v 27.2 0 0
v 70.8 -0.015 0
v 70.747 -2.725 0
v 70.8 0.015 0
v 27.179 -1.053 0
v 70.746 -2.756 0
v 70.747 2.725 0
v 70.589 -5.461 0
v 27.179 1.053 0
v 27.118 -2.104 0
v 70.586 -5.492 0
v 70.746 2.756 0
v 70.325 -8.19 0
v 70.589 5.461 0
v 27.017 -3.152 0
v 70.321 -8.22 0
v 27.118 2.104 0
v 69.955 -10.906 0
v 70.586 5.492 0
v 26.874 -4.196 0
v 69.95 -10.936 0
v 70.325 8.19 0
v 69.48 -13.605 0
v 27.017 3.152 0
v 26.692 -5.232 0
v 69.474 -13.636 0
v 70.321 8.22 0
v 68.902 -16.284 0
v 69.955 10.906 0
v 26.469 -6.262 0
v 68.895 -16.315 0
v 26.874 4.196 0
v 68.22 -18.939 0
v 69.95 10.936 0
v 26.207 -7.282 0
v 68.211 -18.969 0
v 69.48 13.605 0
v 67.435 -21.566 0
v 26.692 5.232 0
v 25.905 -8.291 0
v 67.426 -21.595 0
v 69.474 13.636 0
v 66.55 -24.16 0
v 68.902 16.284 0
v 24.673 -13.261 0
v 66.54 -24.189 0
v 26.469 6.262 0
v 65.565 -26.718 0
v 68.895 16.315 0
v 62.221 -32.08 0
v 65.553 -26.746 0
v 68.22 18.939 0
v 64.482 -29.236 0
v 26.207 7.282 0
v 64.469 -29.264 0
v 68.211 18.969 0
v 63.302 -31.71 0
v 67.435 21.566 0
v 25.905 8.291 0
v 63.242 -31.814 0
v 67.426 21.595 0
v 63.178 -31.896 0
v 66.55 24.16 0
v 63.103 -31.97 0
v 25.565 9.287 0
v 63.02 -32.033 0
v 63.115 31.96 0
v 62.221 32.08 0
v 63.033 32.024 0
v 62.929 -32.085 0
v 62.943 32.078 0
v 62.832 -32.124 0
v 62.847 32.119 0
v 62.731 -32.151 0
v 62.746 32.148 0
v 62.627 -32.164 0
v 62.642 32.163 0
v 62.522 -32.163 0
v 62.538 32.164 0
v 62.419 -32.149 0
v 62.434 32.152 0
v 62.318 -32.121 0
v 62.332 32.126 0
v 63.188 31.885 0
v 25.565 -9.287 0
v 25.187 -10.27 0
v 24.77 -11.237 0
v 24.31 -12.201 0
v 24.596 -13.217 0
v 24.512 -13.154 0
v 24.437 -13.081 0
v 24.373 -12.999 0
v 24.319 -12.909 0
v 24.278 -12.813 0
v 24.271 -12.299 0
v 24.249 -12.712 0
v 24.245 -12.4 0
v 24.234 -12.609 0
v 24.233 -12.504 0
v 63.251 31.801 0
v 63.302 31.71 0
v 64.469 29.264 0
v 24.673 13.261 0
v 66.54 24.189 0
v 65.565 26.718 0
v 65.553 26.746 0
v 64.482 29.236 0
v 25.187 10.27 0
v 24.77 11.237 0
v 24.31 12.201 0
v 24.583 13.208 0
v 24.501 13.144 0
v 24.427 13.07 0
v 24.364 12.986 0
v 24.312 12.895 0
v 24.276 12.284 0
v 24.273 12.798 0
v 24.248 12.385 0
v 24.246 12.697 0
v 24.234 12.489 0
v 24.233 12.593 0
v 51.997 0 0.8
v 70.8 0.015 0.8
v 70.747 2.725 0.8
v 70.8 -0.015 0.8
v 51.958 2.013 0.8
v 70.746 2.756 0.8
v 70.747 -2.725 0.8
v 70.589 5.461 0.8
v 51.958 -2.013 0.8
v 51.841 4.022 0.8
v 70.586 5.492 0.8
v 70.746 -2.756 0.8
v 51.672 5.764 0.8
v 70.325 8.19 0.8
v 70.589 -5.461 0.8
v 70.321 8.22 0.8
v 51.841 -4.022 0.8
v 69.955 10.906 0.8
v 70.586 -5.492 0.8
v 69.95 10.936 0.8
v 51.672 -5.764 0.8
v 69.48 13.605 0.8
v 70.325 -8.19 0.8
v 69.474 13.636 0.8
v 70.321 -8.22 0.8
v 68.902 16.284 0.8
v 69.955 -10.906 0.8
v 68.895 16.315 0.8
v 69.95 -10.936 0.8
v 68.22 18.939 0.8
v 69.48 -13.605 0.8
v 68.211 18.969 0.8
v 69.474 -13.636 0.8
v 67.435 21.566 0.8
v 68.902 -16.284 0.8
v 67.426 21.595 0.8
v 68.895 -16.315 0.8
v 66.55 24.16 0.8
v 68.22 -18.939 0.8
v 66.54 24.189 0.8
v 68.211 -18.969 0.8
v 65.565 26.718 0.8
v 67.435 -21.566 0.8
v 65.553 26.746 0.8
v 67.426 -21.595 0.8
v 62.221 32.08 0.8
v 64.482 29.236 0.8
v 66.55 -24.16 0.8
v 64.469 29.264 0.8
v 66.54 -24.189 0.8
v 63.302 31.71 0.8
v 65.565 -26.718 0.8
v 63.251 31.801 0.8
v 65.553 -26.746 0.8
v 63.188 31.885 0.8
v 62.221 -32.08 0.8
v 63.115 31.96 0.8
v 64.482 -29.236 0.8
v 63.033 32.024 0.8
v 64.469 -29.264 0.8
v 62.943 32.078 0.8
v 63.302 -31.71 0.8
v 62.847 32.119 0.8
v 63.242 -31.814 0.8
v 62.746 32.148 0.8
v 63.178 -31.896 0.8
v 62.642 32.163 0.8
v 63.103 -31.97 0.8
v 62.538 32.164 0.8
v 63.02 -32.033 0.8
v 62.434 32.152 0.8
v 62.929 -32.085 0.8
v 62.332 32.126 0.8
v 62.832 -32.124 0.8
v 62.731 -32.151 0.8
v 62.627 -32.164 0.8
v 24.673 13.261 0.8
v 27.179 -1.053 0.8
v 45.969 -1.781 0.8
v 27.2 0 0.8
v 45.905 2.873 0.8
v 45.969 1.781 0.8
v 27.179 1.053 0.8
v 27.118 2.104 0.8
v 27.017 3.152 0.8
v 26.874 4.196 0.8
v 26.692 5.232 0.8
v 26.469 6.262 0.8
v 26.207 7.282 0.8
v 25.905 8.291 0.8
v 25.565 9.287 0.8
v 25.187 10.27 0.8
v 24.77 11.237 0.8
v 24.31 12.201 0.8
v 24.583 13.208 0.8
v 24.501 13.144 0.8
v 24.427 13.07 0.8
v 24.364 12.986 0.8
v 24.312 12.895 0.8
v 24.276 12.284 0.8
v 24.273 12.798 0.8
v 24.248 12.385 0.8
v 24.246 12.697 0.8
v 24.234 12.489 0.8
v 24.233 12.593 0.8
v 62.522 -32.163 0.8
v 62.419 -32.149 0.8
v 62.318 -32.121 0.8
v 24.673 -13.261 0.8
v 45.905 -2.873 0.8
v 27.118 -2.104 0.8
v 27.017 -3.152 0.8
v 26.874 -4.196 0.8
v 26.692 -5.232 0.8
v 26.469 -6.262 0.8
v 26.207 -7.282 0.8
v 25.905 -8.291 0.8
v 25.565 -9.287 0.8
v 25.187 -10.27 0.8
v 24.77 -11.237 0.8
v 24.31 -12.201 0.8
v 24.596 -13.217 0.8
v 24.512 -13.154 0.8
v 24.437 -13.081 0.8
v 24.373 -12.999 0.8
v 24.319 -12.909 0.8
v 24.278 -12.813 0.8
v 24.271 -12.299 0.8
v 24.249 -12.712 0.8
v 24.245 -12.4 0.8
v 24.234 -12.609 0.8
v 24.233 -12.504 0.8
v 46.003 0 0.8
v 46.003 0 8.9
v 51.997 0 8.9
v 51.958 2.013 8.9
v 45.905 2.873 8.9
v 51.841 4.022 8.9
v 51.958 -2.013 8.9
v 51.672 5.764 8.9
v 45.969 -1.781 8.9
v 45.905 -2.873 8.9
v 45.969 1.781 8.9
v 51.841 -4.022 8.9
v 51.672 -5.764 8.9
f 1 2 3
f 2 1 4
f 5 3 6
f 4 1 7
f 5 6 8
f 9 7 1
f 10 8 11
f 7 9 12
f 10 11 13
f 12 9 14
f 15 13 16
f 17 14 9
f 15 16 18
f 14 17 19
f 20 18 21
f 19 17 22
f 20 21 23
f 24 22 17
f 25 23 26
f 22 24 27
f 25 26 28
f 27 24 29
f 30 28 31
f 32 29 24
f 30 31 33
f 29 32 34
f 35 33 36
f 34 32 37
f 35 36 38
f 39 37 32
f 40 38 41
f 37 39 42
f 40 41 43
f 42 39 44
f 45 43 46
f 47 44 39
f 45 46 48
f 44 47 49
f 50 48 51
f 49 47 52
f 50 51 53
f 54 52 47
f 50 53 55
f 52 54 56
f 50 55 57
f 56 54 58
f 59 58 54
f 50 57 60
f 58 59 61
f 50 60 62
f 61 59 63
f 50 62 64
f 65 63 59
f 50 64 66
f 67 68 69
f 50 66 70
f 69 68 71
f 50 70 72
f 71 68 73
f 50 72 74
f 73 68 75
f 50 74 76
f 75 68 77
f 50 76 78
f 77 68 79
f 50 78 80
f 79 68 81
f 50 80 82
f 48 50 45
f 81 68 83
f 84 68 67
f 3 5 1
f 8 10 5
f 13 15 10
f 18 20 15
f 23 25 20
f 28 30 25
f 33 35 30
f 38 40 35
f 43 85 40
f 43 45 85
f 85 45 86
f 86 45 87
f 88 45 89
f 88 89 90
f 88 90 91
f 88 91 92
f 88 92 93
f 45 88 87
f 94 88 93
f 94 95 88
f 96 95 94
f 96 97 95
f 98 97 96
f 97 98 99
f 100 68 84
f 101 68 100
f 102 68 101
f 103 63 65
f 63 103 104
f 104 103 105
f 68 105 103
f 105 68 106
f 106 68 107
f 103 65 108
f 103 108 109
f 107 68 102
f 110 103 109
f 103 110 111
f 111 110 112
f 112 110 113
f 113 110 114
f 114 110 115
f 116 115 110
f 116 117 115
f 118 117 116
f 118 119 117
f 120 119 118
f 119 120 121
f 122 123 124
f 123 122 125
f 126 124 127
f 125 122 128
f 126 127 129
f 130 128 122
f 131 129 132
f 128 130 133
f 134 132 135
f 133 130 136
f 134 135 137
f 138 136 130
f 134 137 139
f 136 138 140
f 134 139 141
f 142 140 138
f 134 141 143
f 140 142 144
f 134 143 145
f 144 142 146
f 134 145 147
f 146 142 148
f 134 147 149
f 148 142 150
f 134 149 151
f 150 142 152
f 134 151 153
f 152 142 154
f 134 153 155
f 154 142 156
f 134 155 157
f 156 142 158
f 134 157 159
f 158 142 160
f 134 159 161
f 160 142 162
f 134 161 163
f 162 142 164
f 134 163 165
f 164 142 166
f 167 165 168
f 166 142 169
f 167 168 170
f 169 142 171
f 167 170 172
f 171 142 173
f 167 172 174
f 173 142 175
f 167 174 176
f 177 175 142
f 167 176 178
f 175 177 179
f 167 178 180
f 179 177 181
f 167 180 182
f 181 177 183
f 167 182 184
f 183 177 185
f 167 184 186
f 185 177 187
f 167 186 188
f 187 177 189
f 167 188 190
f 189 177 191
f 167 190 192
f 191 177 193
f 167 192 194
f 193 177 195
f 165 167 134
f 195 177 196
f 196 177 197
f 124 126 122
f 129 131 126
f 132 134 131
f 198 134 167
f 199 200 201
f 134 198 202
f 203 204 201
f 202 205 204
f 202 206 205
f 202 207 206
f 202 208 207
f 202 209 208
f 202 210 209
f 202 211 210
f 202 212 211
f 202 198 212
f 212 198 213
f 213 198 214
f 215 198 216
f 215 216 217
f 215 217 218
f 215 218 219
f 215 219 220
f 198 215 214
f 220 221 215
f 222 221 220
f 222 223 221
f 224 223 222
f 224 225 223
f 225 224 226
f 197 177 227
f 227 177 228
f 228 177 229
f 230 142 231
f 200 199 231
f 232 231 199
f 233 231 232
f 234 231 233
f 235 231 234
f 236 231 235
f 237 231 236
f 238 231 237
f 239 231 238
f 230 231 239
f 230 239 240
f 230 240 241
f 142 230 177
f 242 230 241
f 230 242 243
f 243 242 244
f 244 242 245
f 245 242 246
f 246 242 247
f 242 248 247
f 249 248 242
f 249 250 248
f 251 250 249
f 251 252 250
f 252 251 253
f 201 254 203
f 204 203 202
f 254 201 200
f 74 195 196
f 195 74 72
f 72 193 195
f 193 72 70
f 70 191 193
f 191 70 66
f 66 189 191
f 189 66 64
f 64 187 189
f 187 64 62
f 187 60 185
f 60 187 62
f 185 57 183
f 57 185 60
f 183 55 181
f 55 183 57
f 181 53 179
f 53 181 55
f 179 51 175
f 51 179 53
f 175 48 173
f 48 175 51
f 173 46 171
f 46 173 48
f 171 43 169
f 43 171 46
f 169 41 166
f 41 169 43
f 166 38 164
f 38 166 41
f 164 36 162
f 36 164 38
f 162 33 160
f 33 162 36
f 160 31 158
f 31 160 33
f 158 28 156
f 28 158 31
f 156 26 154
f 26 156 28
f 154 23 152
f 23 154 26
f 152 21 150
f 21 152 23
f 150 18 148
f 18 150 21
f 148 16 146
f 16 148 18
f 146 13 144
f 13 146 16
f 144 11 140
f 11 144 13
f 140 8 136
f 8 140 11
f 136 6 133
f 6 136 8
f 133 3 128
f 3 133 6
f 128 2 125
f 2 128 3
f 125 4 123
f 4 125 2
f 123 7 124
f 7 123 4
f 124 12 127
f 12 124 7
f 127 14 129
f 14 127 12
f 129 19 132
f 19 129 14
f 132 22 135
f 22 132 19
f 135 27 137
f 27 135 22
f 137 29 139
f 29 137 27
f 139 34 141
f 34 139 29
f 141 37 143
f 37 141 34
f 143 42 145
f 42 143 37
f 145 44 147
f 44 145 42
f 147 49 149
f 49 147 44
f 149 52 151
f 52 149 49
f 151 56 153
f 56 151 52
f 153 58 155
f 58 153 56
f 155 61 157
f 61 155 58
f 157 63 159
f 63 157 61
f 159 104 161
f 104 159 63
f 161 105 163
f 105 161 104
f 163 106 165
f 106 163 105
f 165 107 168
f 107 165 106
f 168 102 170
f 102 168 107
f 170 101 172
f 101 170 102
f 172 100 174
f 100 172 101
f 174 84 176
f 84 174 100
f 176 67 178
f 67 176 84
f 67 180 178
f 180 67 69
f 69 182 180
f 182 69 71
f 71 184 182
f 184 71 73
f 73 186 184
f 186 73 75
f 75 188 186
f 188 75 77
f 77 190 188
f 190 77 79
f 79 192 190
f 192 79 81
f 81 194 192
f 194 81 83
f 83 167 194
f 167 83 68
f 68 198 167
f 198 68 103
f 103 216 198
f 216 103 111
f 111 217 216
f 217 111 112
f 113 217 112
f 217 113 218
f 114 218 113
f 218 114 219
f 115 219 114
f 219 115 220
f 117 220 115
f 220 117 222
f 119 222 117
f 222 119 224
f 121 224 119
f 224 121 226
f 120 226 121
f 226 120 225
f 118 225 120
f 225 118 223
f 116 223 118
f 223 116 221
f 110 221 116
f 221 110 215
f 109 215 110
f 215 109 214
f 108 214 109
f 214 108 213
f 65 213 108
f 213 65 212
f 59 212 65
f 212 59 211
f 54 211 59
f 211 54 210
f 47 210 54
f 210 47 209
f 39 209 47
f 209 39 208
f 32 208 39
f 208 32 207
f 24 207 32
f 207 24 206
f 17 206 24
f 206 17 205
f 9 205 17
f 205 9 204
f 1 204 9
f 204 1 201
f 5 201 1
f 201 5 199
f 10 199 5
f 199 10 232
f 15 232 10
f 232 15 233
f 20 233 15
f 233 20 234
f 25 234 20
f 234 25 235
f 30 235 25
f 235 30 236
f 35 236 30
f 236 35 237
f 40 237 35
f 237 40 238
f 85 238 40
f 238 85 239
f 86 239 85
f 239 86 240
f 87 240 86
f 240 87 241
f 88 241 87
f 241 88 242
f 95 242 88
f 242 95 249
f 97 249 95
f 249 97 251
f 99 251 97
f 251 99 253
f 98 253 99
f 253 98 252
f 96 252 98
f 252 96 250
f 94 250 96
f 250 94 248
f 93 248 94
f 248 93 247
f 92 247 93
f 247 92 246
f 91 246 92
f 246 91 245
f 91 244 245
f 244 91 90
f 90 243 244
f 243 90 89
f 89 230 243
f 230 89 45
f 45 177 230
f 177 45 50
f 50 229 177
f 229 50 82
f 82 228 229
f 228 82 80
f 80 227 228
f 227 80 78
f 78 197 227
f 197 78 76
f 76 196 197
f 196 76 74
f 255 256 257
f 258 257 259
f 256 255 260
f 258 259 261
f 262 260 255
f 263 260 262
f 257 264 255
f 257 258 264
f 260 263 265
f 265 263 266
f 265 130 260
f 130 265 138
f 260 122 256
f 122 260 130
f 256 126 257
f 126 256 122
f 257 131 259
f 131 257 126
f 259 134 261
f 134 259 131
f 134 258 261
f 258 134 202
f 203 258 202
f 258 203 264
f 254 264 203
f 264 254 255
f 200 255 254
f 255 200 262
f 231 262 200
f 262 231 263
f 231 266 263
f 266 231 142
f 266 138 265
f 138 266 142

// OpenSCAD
// file: parameters.scad
// =============================================================================
// Gen-BR — nightly 2026-10-09 (physics_scorer, honest magpylib watts)
// Rotor-only swap for Gen-BO: the diametric Ø5 assists move from ±7 mm to ±6.2 mm around the R50 pole ring (R43.8/50/56.2), the closest spacing that still leaves a 0.9 mm printed web between Ø5.3 pockets (rule ≥0.8). Everything else — bobbins, 595 t windings, stator, Ø134 steel — is Gen-BO. Tonight's 138-row refine scan (ring radius 49–51, coil radii ±0.5, build ±0.4, copper height 7.9–8.3) found nothing better: the 8p/6c flush-seat family is saturated under the ~370 m wire budget, so this is a hair-width step (about +0.2 % over Gen-BO), not a breakthrough.
// Clocking 0 deg (magnets N facing S) + D-flat keyed bore + index notch + flip-symmetric hole map.
// Windable 2-piece bobbin; turns = physics_scorer turns_fit; copper only between flanges.
// Steel back-iron: 2× Ø134 × 4.76 mm (3/16") mild-steel discs (steel_backiron_disc.dxf); magnets sit ON the steel
// (through-pockets) -> score with --back-iron.
// =============================================================================
topology            = "dual_rotor";

// --- Wire / winding (physics_scorer winding-fit) -------------------------------
wire_awg            = 26;
wire_od             = 0.45;     // insulated OD mm (bare 0.405)
fill_realistic      = 0.65;     // insulated-wire area / window (DENSE layered wind with a jig; scorer cap 0.65)
turns               = 595;       // = physics_scorer turns_fit (do NOT raise)
coil_former_type    = "bobbin";
coil_core_inset     = 18.00;     // radial copper build: hub = copper boundary inset by this
wind_build_axial    = 0.0;      // nothing proud of the flanges
wind_build_radial   = 0.0;

// --- Bobbin (base + lid) ---------------------------------------------------------
coil_id_r           = 28.00;    // copper boundary sector
coil_od_r           = 70.00;
span_deg            = 53.24;    // = pitch - 2*asin((wall+0.85)/coil_id_r) -> >=1.2 mm stator web
former_web          = 8.10;     // copper height between flanges (TALL copper: steel keeps Bz up)
flange_t            = 0.80;     // >= 0.8 mm FDM wall rule (tall winds push on the flanges)
wall                = 0.80;     // flange lip beyond copper
former_bare_h       = former_web + 2 * flange_t;
coil_envelope_h     = former_bare_h + 2 * wind_build_axial;
tab_w               = 7.0;
tab_len             = 7.0;
tab_h               = former_bare_h / 2;
pin_d               = 1.9;      // 1.75 mm filament locating pin
coil_mount_r        = coil_od_r + 0.2 + 4.0;
lead_y              = 1.6;
lead_slot_w         = 0.9;
lead_groove_d       = 0.6;

// --- Gap -------------------------------------------------------------------------
run_clear           = 0.50;     // rotor face -> flange
gap_spacer_h        = run_clear + wind_build_axial;
m2m                 = coil_envelope_h + 2 * run_clear;   // rotor face to rotor face (= gap_sleeve length)

// --- Stator ----------------------------------------------------------------------
coil_stations       = 6;
bay_clear           = 0.25;
stator_thick        = former_bare_h;                        // bobbins flush both faces
stator_od           = 158;
shaft_clear_stator  = 14.0;     // stator is static; gap sleeve OD 12 spins inside

// --- Rotor(s) --------------------------------------------------------------------
magnet_Br           = 1.43;     // N52
magnet_d_large      = 20.0;
magnet_h_large      = 5.0;      // one O20x5 per pocket
magnet_h_small      = 5.0;      // one O5x5 per pocket
halbach_magnetisation = "diametric"; // O5x5 assist magnets MUST be DIAMETRICALLY magnetised (tangential)
rotor_b_same_axis   = true;     // same-index magnets share one axis: N faces S across the gap
large_pocket_d      = 20.3;
small_pocket_d      = 5.3;
pocket_h            = 5.00;     // THROUGH the carrier: magnet back face sits on the steel disc (FLUSH seat: carrier = magnet height, magnet face level with the rotor face)
large_n             = 8;
R_large             = 50.0;
R_small_inner       = 43.8;
R_small_mid         = 50.0;
R_small_outer       = 56.2;
small_r_list        = [R_small_inner, R_small_mid, R_small_outer];   // O5 pockets between poles
carrier_od          = 134.0;
carrier_thick       = pocket_h;
hub_h               = 12.0;     // > steel_t + insert: radial set-screw clears the steel
hub_od              = 24.0;     // slim hub so the M4 brace rods fit at R~18 inside the coil ring
hub_insert_d        = 4.0;      // M3 heat-set insert, radial, bears on the D-flat
rotor_b_offset_deg  = 0.0;      // CLOCKING: magnets directly opposite
shaft_key           = "dflat";
dflat_depth         = 0.5;      // 8 mm shaft with 0.5 mm flat (7.5 across flat)
index_notch_d       = 3.0;

// --- Steel back-iron (buyable laser-cut) -------------------------------------------
steel_t             = 4.76;      // mild steel thickness (image method ignores it; sized from steel_flux.py so the return path stays well below saturation)
steel_center_hole   = 26.0;     // slips over the rotor hub (OD 24)
steel_od            = carrier_od;   // steel disc OD = rotor carrier OD

// --- Modular MAX interface ----------------------------------------------------------
shaft_bore          = 8.35;
dflat_x             = 4.0 - dflat_depth + (shaft_bore - 8.0) / 2;
bearing_d           = 21.85;
bearing_h           = 7.2;
m3_clear            = 3.5;
bolt_r_inner        = 30.0;     // M3 steel-disc clamp bolts (inside the magnet ring)
bolt_n_inner        = 4;
bolt_inner_angles   = [0, 90, 180, 270];
bolt_r_outer        = 63.0;     // M3 steel-disc clamp bolts (outside the magnet ring)
bolt_outer_angles   = [45, 135, 225, 315];
flange_bolt_r       = 73.0;     // frame rods: OUTSIDE the rotor OD (rotors spin inside them)
flange_bolt_n       = 6;
flange_bolt_offset  = 30.00;    // between coil stations -> never cuts a lead groove/tab
brace_r             = 18.0;
brace_d             = 4.3;      // temporary M4 jack rods (assembly only)
brace_n             = 4;
brace_angles        = [45, 135, 225, 315];          // flip-symmetric

spacer_pad_od       = 14.0;
spacer_pad_id       = m3_clear;
endbell_od          = 158;
endbell_thick       = 8.0;
endbell_shaft_clear = 10.0;
collar_h            = 10.0;
standoff_od         = 9.0;
frame_standoff_h    = run_clear + carrier_thick + hub_h + collar_h + 2.0;
sleeve_od           = 12.0;
plate_max_mm        = 410;

$fn = 64;
// main file
// Gen-BR — bobbin BASE (bottom flange + hub). Print x6, flange down. Wind 26 AWG x 595 t around
// the hub with the LID glued on (coil_lid.stl). Copper lives ONLY between the flanges (no proud winds).
include <parameters.scad>;
$fn = 48;
module sector_2d(r_in, r_out, ang) {
    polygon([
        for (a = [-ang/2 : ang/24 : ang/2]) [r_in*cos(a), r_in*sin(a)],
        for (a = [ang/2 : -ang/24 : -ang/2]) [r_out*cos(a), r_out*sin(a)]
    ]);
}
module footprint_2d() { offset(r=wall) sector_2d(coil_id_r, coil_od_r, span_deg); }
module hub_2d()       { offset(delta=-coil_core_inset) sector_2d(coil_id_r, coil_od_r, span_deg); }

union() {
    linear_extrude(flange_t) footprint_2d();
    translate([0, 0, flange_t - 0.01]) linear_extrude(former_web + 0.01) hub_2d();
}
